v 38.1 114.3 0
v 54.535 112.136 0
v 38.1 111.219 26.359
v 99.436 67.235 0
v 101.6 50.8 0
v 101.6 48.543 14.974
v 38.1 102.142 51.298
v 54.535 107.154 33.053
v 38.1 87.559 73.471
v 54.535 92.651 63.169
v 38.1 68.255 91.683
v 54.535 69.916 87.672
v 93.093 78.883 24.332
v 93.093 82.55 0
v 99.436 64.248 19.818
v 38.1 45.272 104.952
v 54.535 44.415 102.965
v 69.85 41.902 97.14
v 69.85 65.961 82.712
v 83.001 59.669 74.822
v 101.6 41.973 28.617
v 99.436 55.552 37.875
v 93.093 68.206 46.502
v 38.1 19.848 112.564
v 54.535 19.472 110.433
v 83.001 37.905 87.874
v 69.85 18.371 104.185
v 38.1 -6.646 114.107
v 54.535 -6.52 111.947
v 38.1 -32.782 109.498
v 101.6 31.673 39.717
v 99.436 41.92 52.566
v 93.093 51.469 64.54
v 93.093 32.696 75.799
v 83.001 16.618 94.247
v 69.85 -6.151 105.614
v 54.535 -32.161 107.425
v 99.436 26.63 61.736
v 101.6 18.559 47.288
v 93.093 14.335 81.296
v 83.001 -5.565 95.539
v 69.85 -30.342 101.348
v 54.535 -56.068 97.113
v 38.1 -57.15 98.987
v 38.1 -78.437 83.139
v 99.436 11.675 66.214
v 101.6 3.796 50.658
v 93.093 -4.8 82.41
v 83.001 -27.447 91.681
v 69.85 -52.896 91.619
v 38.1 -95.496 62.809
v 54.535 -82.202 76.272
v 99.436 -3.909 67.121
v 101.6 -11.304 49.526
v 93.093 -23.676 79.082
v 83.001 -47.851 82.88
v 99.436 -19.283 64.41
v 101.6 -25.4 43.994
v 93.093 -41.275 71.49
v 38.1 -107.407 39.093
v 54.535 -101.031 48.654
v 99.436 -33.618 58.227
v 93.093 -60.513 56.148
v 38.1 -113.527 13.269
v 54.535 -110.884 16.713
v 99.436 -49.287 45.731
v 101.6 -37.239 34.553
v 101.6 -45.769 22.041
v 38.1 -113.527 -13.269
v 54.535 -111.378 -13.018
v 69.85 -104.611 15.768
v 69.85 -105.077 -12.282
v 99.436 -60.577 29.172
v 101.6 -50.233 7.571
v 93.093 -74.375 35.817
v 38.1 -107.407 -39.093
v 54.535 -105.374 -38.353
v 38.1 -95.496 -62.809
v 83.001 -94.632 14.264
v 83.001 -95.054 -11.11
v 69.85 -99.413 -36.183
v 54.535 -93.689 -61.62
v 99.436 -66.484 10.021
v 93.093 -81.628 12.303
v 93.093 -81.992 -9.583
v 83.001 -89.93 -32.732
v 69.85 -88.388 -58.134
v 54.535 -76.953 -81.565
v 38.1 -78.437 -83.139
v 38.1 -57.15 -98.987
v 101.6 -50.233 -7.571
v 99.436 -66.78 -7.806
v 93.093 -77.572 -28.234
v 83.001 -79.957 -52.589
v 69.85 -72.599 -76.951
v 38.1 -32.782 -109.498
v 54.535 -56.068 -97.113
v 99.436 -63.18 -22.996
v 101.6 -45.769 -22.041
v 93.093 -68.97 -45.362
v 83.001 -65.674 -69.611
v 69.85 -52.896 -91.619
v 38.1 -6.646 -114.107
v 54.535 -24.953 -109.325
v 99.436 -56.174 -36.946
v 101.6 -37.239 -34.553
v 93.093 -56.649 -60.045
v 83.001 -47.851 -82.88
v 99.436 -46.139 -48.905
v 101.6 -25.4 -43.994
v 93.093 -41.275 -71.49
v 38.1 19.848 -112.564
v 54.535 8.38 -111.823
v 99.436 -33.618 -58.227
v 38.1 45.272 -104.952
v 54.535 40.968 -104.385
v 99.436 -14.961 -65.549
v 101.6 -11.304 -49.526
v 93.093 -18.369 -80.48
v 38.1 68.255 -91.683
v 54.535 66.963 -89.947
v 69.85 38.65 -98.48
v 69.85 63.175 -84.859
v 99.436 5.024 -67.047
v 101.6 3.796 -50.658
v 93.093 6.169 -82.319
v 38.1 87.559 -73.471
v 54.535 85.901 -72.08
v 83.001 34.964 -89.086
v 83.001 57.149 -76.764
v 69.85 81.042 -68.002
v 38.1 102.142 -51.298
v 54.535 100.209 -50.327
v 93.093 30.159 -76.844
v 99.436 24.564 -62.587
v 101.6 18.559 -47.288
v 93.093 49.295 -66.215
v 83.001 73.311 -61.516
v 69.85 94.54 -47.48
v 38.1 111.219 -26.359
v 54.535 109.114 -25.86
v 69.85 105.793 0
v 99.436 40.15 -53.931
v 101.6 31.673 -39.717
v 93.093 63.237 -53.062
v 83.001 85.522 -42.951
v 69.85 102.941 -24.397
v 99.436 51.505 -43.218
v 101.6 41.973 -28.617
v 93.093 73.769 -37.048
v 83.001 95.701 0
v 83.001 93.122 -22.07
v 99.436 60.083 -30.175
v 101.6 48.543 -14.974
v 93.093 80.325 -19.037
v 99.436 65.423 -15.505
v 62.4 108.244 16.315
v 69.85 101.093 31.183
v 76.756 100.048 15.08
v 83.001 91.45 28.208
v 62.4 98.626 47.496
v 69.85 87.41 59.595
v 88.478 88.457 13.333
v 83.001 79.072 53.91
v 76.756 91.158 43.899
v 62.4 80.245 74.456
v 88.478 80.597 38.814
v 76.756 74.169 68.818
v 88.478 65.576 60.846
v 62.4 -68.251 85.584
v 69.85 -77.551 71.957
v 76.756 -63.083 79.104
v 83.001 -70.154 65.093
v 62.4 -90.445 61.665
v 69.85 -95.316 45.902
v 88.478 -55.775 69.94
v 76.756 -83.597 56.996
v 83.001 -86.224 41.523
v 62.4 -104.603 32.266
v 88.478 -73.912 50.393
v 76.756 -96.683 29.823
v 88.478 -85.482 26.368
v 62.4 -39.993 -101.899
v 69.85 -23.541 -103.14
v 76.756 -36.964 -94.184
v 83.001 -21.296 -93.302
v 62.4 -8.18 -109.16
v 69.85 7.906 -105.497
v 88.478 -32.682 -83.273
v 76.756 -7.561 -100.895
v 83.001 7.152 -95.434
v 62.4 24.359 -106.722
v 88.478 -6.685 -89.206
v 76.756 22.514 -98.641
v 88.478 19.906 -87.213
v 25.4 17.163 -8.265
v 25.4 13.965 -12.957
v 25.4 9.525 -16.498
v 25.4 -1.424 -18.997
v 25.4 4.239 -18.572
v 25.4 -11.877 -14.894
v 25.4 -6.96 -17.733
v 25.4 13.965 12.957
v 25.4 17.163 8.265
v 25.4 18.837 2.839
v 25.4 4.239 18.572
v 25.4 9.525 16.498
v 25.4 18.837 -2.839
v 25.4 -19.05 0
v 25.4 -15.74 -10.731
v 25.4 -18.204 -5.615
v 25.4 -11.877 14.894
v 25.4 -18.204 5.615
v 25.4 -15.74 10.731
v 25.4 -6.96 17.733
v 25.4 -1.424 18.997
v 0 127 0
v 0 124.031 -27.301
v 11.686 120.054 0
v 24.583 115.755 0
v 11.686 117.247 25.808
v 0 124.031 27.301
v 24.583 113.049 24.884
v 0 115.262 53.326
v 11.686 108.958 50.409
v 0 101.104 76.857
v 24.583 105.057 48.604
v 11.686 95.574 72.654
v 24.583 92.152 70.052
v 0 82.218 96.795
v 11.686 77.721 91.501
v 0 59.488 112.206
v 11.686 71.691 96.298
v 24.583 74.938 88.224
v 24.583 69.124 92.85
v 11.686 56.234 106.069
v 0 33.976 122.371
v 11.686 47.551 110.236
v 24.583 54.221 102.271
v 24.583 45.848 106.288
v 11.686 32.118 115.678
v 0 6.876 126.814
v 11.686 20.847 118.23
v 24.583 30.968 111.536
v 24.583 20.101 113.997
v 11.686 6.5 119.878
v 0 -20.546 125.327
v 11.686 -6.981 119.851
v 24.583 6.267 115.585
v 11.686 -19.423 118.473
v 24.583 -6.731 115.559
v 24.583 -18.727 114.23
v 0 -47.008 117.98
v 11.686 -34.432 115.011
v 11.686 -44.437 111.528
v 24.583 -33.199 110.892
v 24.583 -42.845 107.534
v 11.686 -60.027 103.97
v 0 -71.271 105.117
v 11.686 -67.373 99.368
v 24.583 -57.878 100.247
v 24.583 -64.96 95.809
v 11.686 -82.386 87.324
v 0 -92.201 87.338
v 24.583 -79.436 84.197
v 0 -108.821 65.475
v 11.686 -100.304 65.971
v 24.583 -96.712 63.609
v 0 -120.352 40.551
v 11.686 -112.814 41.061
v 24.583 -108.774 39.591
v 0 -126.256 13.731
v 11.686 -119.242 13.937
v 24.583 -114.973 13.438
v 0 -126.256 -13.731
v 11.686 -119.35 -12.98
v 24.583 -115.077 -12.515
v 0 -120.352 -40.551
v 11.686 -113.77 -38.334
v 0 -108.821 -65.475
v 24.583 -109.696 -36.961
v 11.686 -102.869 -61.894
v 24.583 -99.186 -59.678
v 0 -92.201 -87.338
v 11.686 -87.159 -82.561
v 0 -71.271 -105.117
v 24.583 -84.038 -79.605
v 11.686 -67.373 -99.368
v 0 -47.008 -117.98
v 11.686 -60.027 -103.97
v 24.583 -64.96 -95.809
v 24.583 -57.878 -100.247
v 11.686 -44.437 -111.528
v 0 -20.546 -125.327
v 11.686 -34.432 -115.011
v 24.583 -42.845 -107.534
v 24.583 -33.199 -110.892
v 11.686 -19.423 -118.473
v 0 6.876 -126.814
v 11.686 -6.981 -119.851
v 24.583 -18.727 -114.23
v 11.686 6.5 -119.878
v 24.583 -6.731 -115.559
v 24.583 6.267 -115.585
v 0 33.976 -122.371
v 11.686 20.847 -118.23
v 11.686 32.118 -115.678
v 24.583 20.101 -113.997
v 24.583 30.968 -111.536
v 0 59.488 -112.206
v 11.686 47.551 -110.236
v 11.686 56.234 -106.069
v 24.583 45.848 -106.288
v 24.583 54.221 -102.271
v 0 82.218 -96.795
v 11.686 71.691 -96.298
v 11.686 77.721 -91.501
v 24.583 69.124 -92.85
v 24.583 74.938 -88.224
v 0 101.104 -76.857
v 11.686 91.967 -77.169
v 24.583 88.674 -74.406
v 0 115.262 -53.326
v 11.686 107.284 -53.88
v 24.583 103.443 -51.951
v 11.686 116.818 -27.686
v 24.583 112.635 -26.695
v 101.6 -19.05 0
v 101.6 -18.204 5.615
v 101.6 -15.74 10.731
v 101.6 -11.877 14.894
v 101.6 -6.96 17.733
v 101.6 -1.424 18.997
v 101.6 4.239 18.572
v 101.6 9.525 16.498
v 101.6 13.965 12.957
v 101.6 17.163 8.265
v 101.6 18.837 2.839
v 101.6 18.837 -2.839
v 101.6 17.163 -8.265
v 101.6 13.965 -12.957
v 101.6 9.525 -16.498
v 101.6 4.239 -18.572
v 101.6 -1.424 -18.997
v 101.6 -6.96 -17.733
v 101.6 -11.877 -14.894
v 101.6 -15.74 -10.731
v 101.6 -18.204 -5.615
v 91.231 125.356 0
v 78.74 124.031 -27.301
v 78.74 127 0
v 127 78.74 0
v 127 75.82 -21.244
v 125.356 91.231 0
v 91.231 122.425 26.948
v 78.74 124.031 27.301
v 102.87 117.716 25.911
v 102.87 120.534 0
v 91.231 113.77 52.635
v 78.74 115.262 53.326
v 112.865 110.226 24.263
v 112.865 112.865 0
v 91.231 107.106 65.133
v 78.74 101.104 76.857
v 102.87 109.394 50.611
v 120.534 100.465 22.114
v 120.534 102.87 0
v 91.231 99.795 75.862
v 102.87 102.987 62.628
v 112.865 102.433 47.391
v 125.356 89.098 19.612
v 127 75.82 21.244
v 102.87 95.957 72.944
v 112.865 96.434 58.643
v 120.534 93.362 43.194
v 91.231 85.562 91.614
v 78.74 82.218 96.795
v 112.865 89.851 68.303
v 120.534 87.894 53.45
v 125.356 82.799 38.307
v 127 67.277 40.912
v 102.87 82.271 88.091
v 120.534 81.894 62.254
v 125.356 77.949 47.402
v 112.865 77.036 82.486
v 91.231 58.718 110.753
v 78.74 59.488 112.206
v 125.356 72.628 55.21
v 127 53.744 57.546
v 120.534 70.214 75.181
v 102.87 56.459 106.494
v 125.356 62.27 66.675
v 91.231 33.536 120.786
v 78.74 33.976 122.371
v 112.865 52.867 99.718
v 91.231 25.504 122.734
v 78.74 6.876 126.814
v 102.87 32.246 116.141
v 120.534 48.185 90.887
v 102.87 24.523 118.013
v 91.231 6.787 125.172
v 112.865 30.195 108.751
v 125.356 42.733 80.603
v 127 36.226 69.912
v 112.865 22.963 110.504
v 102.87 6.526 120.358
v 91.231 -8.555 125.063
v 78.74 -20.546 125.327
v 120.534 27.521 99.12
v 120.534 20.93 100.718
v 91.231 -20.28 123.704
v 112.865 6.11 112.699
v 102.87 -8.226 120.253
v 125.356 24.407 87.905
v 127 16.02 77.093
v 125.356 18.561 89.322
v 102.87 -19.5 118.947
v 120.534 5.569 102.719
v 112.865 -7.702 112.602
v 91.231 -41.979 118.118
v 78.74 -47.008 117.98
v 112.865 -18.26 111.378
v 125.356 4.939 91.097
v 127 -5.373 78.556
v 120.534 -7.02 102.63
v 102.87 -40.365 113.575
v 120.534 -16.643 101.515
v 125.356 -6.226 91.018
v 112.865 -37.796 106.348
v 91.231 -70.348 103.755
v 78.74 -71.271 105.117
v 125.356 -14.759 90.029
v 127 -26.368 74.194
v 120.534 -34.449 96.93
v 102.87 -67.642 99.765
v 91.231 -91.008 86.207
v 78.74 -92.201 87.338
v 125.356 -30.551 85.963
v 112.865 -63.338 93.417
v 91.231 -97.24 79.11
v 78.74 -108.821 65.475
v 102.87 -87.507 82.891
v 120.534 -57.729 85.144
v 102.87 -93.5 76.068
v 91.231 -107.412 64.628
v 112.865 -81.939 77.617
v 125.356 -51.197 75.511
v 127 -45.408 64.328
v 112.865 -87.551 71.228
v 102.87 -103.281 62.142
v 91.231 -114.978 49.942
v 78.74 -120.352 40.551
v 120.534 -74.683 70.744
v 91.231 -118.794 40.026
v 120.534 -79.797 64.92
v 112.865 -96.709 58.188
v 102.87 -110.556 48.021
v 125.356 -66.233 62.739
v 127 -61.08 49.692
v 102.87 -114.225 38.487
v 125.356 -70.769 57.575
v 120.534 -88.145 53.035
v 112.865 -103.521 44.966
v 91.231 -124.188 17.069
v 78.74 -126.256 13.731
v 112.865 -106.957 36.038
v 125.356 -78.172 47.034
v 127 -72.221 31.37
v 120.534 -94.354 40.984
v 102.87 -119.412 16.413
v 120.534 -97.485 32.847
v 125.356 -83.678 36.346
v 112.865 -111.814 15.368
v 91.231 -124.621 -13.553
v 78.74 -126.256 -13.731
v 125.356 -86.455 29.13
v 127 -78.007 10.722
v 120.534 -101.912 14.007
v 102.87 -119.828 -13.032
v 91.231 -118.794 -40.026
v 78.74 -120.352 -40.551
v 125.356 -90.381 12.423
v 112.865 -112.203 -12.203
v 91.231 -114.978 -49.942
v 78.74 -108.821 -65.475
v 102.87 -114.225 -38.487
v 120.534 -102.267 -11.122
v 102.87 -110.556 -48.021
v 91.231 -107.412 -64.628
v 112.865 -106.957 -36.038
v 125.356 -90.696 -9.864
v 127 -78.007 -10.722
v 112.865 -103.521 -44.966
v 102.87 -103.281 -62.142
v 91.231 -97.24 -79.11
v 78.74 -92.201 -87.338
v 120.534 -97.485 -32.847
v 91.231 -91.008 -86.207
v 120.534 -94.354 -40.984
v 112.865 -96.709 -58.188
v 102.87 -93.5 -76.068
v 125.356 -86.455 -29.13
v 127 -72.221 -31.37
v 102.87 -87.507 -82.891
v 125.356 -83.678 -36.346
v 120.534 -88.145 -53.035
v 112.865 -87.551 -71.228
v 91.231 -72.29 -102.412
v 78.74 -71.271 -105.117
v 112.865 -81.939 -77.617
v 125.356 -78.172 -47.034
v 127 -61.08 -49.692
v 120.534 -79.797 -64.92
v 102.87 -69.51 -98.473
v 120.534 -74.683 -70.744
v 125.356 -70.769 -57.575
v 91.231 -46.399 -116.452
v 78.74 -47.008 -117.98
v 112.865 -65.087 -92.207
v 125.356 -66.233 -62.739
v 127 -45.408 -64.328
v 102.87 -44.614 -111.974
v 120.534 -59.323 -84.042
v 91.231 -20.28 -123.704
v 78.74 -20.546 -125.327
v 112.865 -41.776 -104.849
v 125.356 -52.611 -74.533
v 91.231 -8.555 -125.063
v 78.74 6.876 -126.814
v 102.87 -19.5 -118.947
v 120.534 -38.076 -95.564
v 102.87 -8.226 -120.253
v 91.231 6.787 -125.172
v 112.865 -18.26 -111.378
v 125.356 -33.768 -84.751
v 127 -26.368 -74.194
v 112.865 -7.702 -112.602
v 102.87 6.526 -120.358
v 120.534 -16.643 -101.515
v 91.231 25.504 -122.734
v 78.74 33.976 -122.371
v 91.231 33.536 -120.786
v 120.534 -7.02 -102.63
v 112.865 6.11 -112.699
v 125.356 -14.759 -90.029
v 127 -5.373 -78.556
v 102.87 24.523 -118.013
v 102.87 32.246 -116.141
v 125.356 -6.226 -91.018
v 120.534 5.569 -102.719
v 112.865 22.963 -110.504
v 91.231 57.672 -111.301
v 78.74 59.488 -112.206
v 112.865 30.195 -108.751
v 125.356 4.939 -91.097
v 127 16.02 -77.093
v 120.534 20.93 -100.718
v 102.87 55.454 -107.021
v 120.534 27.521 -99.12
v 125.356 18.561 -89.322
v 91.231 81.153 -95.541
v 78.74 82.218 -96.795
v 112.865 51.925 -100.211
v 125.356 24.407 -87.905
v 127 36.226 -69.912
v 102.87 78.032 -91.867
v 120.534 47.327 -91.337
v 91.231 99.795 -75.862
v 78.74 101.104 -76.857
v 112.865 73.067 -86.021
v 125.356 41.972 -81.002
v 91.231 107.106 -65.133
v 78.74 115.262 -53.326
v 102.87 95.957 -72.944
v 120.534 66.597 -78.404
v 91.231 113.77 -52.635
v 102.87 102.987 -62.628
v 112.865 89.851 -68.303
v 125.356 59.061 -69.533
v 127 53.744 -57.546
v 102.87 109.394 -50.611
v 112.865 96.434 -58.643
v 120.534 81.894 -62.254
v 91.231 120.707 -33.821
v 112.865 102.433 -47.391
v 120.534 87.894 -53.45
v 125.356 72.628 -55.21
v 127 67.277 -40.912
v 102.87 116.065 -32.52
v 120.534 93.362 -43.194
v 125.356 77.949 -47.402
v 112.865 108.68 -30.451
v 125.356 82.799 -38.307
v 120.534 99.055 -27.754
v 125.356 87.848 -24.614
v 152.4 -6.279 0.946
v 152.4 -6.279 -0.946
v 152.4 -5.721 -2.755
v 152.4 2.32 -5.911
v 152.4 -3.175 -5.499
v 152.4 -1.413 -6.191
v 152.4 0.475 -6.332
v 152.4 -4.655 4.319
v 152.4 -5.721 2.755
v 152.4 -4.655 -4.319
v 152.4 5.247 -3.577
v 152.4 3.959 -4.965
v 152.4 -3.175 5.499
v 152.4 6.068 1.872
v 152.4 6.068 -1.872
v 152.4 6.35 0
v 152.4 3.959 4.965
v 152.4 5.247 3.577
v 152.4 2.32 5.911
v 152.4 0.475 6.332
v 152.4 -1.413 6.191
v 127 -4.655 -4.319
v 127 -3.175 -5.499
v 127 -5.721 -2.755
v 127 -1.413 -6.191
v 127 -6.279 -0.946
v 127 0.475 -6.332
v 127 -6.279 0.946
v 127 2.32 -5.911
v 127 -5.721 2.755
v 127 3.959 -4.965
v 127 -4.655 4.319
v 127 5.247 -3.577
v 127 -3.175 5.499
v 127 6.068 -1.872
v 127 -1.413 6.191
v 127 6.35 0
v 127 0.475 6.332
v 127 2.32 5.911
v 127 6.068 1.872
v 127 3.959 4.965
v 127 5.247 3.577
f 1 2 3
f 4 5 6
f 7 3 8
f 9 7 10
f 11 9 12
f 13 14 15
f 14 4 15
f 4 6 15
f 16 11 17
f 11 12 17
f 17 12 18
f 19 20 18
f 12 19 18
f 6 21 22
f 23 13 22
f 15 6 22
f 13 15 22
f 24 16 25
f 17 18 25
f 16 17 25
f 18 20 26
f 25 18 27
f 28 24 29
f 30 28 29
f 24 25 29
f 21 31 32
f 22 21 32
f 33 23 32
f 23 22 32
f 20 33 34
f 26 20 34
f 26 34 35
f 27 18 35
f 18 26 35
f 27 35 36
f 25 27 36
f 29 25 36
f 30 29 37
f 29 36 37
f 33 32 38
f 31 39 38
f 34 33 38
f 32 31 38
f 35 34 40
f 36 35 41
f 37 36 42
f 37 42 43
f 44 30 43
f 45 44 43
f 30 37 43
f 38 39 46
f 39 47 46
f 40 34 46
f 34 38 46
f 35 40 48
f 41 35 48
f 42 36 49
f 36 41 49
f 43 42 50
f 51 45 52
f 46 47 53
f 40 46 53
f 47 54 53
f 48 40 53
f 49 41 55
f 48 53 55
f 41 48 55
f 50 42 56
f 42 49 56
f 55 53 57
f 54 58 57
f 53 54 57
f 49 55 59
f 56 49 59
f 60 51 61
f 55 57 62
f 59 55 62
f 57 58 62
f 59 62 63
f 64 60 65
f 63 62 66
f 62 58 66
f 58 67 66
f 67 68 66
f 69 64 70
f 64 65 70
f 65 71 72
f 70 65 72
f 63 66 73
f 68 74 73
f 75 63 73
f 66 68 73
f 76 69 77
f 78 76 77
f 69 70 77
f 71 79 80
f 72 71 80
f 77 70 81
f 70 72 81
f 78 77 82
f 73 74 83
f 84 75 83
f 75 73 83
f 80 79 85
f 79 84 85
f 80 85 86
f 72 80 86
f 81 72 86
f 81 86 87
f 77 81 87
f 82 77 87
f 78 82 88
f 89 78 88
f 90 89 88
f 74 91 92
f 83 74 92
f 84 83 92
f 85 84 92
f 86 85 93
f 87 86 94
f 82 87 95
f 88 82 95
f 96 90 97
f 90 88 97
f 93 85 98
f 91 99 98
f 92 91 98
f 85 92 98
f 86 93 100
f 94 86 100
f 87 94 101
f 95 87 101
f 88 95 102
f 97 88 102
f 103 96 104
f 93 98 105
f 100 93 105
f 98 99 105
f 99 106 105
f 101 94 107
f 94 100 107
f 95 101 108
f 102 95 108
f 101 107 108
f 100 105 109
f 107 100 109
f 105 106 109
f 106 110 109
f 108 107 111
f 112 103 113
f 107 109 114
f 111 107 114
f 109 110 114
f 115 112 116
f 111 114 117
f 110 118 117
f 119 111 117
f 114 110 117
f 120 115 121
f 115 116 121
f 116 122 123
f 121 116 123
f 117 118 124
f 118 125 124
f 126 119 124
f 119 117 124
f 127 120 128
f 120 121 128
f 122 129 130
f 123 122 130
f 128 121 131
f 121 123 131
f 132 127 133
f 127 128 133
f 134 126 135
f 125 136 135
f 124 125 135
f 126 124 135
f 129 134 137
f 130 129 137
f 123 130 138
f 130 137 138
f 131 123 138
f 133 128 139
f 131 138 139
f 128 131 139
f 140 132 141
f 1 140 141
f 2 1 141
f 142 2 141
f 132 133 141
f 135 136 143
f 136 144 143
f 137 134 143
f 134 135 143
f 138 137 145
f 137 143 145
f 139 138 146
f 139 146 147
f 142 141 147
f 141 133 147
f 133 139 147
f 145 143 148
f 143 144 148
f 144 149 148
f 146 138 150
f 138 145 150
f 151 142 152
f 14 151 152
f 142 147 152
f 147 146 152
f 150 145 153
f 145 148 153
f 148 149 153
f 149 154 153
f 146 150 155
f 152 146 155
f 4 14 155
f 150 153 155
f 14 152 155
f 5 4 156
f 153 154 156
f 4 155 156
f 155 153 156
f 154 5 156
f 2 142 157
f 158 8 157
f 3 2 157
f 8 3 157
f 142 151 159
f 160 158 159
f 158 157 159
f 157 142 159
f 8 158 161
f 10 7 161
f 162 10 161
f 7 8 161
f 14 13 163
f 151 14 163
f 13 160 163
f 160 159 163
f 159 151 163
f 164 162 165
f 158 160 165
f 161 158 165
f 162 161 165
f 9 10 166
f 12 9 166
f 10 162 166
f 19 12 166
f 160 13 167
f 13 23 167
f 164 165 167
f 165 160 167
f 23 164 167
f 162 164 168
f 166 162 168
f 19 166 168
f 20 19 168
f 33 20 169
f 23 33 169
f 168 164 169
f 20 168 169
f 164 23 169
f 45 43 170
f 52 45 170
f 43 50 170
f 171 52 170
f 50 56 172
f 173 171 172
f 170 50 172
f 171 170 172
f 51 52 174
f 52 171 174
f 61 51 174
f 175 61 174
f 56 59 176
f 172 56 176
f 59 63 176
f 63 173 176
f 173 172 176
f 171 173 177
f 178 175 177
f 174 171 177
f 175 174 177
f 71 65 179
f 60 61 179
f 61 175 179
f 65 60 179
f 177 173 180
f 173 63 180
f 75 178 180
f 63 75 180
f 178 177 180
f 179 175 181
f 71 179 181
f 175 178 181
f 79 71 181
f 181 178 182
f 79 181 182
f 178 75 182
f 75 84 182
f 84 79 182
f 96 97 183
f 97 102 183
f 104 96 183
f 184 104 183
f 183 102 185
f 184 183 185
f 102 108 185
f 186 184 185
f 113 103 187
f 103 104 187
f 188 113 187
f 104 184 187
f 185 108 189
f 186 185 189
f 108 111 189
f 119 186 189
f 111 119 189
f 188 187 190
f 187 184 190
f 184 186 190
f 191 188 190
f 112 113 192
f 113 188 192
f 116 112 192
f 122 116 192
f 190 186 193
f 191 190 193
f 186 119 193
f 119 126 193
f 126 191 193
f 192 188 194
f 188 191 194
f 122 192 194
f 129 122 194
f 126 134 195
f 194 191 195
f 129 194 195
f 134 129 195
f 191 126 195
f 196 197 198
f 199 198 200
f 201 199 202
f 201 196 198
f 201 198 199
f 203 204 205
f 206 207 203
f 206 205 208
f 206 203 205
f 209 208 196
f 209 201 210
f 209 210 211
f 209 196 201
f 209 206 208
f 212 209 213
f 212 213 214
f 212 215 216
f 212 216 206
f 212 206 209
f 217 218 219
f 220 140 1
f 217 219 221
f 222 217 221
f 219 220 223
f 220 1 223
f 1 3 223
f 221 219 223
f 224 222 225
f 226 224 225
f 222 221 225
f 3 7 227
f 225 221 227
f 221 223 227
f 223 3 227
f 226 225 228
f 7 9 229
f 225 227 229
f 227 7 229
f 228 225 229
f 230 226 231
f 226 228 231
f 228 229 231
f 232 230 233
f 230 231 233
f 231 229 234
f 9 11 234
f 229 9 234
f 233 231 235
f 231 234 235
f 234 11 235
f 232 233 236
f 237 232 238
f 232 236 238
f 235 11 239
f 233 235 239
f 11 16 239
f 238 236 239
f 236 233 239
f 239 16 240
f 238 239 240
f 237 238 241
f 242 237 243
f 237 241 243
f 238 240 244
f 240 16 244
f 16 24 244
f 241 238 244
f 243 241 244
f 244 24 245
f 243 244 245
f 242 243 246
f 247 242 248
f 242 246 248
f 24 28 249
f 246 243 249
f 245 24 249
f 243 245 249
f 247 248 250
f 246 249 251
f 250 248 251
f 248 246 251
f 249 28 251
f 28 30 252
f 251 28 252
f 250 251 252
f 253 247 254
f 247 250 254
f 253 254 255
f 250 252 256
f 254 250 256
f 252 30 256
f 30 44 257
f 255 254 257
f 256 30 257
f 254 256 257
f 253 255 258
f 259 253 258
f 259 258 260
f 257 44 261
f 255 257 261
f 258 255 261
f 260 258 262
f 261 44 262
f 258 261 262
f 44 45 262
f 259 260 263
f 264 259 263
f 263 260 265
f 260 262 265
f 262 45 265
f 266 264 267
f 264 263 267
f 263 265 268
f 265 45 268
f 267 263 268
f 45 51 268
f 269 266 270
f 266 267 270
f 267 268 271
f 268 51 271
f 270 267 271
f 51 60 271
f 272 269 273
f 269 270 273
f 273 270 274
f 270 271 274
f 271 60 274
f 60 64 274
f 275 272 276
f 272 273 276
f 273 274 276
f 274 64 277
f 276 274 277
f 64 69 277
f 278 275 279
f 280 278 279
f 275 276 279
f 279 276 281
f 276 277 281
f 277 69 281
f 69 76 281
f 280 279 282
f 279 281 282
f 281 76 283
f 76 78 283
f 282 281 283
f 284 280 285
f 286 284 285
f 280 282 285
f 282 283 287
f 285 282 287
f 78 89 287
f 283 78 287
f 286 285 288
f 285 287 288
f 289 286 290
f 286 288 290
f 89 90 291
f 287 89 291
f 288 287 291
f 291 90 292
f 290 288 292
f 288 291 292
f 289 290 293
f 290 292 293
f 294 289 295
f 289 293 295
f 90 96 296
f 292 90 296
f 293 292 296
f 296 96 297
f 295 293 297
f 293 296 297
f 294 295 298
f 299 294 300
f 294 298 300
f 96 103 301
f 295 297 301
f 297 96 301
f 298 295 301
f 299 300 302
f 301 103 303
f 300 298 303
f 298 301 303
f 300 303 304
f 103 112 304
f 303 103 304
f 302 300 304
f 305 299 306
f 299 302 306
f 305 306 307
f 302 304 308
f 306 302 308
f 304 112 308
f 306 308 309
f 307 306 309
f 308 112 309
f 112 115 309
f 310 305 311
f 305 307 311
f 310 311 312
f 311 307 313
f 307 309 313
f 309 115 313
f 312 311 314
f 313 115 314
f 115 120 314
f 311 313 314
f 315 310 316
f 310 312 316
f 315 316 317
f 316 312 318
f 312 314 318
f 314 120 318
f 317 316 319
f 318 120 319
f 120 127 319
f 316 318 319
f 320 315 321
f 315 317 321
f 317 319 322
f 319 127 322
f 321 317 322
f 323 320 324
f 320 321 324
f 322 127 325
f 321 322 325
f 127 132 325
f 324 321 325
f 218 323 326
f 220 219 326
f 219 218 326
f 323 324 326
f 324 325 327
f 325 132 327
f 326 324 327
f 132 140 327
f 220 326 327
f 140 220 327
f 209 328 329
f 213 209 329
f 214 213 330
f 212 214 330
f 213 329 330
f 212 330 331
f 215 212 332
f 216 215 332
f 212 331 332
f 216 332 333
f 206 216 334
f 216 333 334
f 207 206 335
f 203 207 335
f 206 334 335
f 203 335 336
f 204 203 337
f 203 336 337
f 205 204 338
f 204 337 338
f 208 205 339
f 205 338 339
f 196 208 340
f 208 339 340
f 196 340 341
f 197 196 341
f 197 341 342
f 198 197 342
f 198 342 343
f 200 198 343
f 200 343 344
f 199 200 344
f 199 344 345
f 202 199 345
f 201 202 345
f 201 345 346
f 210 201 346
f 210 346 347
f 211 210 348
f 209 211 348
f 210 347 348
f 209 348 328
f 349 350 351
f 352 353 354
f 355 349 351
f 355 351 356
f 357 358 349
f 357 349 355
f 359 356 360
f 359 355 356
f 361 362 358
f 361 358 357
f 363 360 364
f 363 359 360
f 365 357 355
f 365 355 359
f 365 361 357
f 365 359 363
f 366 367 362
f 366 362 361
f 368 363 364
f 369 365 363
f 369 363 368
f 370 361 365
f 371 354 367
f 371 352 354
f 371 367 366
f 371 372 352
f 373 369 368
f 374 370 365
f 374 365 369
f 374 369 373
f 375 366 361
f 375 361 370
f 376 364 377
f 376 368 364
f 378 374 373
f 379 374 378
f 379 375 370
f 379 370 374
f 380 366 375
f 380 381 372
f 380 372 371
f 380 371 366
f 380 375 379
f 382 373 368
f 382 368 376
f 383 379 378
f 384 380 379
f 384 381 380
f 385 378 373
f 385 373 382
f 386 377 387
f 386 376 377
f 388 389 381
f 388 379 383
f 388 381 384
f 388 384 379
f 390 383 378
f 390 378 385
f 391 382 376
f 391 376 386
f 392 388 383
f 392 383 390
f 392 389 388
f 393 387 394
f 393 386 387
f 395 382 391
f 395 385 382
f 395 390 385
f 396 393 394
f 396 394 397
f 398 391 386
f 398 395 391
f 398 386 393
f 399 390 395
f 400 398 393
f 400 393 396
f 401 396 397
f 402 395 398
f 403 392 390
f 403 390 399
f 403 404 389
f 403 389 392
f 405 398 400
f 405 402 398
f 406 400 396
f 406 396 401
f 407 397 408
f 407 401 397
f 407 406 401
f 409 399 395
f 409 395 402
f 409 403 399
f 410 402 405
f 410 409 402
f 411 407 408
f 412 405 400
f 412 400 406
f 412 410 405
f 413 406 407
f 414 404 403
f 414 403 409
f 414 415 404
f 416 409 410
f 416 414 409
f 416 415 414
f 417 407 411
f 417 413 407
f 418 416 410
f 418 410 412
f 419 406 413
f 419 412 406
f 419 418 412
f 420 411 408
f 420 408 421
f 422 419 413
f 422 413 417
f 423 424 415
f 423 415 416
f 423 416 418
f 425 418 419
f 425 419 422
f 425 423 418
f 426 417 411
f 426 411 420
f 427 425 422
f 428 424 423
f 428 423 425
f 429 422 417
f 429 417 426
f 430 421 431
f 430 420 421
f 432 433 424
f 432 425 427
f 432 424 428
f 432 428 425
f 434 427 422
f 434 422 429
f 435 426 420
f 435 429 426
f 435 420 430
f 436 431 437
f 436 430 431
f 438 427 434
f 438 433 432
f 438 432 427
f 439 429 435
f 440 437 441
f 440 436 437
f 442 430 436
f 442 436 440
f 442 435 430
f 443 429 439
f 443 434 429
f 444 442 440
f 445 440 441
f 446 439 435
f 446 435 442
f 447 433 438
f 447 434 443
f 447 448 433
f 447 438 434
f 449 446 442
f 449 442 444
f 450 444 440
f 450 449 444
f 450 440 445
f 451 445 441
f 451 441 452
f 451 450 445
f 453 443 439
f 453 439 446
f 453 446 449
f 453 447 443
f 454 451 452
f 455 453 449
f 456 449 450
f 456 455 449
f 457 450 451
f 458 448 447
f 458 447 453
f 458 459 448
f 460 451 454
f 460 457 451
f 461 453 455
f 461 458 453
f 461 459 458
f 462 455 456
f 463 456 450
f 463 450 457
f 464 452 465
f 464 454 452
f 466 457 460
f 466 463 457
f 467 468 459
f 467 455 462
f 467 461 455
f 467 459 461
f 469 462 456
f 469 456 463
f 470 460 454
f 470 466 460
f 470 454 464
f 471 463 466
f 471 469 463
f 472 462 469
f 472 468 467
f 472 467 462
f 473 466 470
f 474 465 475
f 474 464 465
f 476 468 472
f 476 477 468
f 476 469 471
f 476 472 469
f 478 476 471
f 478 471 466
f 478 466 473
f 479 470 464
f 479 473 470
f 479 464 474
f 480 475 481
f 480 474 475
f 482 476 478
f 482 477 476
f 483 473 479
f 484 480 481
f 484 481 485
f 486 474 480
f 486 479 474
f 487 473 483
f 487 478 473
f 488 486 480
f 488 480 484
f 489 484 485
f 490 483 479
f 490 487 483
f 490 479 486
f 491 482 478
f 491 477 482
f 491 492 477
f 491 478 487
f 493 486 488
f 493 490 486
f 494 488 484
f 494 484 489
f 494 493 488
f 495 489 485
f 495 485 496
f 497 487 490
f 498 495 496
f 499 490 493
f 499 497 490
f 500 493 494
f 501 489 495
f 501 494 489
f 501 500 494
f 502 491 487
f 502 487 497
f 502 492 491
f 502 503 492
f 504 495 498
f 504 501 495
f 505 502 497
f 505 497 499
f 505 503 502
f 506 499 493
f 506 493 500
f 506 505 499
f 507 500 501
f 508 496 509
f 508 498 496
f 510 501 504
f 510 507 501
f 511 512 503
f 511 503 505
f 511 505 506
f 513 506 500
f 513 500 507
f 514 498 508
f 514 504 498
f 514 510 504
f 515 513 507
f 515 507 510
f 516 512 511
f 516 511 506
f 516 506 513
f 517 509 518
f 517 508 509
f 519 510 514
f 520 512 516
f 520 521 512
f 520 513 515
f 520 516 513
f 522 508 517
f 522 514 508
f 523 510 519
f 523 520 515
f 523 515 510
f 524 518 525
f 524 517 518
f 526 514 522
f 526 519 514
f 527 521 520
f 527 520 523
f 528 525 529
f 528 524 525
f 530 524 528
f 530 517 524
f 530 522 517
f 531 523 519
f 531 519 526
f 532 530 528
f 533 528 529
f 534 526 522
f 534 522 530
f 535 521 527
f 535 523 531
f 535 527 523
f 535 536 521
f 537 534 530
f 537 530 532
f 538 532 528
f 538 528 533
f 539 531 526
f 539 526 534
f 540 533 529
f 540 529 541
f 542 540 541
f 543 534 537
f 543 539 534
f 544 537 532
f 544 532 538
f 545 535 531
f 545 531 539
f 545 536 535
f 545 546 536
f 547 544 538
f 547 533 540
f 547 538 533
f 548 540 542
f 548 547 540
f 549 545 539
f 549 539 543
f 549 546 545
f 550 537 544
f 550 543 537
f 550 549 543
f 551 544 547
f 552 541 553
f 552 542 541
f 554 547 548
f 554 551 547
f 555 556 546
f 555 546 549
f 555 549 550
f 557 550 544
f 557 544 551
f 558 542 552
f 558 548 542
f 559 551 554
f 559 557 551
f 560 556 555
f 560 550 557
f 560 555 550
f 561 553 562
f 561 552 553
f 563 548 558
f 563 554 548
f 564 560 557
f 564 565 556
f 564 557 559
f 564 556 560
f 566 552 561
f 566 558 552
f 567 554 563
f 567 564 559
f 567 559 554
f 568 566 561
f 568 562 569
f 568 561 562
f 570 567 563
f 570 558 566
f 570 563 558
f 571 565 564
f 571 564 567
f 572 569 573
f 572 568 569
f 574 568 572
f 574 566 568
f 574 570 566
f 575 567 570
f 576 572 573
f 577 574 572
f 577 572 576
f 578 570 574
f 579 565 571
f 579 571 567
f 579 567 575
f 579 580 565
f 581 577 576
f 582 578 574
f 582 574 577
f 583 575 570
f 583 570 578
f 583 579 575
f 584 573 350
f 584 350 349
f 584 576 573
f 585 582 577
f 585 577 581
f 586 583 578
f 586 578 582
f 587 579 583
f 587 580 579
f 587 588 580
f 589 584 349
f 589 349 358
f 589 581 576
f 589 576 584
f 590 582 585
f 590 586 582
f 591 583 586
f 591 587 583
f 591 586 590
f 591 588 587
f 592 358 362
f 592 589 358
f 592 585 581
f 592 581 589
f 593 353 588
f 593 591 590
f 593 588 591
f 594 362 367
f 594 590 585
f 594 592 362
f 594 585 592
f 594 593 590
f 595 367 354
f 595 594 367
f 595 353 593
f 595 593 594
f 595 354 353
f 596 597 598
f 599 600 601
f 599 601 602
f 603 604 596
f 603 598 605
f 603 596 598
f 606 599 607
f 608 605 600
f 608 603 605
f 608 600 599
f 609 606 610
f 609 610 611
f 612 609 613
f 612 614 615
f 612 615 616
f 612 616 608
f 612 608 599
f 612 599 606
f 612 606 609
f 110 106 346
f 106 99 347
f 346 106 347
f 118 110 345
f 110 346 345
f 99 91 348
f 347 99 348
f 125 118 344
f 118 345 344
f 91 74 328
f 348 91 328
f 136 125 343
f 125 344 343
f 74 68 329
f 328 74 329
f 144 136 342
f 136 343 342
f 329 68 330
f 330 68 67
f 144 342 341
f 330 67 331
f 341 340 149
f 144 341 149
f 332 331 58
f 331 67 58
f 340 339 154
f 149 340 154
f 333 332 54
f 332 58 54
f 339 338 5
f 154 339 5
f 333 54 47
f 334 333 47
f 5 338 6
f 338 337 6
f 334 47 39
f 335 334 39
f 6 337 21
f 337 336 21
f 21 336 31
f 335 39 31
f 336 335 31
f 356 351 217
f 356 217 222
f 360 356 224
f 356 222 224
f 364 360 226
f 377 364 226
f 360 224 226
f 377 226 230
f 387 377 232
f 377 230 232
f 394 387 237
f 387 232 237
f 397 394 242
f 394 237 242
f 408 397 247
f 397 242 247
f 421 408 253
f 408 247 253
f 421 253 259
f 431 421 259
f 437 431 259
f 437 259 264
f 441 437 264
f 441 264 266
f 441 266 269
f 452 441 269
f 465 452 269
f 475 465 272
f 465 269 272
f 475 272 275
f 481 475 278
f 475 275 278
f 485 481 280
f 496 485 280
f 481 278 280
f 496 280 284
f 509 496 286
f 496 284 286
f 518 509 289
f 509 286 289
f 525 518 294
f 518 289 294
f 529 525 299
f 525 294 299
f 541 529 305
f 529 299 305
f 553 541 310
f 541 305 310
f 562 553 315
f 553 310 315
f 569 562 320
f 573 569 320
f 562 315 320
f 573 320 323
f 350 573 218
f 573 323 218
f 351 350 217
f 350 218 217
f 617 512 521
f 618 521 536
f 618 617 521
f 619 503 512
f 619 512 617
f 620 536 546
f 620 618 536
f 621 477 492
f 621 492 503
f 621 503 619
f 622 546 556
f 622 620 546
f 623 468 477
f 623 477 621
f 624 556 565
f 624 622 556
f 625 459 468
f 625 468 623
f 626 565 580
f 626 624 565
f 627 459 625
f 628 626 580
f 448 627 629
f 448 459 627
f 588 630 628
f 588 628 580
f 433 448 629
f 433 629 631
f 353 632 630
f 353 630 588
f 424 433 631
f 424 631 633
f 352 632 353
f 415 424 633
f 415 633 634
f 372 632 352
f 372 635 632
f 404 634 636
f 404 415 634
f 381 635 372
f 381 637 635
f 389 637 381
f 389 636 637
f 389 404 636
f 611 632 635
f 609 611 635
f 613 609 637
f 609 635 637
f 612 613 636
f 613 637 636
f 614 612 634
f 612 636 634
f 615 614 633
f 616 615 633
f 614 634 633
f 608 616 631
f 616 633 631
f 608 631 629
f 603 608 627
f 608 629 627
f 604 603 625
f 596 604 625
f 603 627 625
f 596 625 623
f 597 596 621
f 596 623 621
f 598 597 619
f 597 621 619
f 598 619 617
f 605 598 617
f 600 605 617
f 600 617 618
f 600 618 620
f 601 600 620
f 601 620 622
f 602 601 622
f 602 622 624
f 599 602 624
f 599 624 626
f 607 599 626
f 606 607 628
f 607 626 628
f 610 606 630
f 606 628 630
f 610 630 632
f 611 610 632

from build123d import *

# Parameters (mm, degrees)
F0_R     = 127
F1_DEPTH = 127
F2_R     = 114.3
F3_DEPTH = 101.6
F4_R     = 48.26
F6_R     = 6.35
F7_DEPTH = 25.4
F8_R     = 19.05
F9_DEPTH = 76.2


# Not quite as in the source:
# - a fillet or chamfer that OpenCascade refuses, or shapes differently, is made with other operations: its cross-section is extruded or revolved along the edge and cut away or added


with BuildPart() as f1:
    # F0 (on Right) → F1 (new body)
    with BuildSketch(Plane.YZ):
        Circle(F0_R)
    extrude(amount=F1_DEPTH)

    # F2 (on Right) → F3 (cut)
    with BuildSketch(Plane.YZ):
        Circle(F2_R)
    extrude(amount=F3_DEPTH, mode=Mode.SUBTRACT)

    # F4
    f4_edges = [f1.edges().sort_by_distance(p)[0] for p in [
        (127, -127, 0),
    ]]
    fillet(f4_edges, radius=F4_R)

    # F5: fillet of radius 63.5 on 3 edges, made by hand

    # F5_s1 → F5_t2 (revolve)
    with BuildSketch(Plane.XY):
        with BuildLine():
            ThreePointArc((38.1, 114.3), (83.0012806053, 95.7012806053), (101.6, 50.8))
            Line((101.6, 50.8), (101.6, 114.3))
            Line((101.6, 114.3), (38.1, 114.3))
        make_face()
    revolve(axis=Axis((101.6, 0, 0), (1, 0, 0)))

    # F5_s3 → F5_t4 (revolve, cut)
    with BuildSketch(Plane.XY):
        with BuildLine():
            ThreePointArc((0, 127), (18.0195368579, 117.5586105738), (38.1, 114.3))
            Line((38.1, 114.3), (38.1, 107.95))
            Line((38.1, 107.95), (0, 107.95))
            Line((0, 107.95), (-6.35, 114.3))
            ThreePointArc((-6.35, 114.3), (-6.35, 120.65), (-3.81, 121.92))
            Line((-3.81, 121.92), (0, 127))
        make_face()
    revolve(axis=Axis((0, 0, 0), (1, 0, 0)), mode=Mode.SUBTRACT)

    # F6 (on face) → F7 (join)
    with BuildSketch(Plane.YZ.offset(127)):
        Circle(F6_R)
    extrude(amount=F7_DEPTH)

    # F8 (on face) → F9 (join)
    with BuildSketch(Plane(origin=(101.6, 0, 0), x_dir=(0, -1, 0), z_dir=(-1, 0, 0))):
        Circle(F8_R)
    extrude(amount=F9_DEPTH)


solid = f1.part
